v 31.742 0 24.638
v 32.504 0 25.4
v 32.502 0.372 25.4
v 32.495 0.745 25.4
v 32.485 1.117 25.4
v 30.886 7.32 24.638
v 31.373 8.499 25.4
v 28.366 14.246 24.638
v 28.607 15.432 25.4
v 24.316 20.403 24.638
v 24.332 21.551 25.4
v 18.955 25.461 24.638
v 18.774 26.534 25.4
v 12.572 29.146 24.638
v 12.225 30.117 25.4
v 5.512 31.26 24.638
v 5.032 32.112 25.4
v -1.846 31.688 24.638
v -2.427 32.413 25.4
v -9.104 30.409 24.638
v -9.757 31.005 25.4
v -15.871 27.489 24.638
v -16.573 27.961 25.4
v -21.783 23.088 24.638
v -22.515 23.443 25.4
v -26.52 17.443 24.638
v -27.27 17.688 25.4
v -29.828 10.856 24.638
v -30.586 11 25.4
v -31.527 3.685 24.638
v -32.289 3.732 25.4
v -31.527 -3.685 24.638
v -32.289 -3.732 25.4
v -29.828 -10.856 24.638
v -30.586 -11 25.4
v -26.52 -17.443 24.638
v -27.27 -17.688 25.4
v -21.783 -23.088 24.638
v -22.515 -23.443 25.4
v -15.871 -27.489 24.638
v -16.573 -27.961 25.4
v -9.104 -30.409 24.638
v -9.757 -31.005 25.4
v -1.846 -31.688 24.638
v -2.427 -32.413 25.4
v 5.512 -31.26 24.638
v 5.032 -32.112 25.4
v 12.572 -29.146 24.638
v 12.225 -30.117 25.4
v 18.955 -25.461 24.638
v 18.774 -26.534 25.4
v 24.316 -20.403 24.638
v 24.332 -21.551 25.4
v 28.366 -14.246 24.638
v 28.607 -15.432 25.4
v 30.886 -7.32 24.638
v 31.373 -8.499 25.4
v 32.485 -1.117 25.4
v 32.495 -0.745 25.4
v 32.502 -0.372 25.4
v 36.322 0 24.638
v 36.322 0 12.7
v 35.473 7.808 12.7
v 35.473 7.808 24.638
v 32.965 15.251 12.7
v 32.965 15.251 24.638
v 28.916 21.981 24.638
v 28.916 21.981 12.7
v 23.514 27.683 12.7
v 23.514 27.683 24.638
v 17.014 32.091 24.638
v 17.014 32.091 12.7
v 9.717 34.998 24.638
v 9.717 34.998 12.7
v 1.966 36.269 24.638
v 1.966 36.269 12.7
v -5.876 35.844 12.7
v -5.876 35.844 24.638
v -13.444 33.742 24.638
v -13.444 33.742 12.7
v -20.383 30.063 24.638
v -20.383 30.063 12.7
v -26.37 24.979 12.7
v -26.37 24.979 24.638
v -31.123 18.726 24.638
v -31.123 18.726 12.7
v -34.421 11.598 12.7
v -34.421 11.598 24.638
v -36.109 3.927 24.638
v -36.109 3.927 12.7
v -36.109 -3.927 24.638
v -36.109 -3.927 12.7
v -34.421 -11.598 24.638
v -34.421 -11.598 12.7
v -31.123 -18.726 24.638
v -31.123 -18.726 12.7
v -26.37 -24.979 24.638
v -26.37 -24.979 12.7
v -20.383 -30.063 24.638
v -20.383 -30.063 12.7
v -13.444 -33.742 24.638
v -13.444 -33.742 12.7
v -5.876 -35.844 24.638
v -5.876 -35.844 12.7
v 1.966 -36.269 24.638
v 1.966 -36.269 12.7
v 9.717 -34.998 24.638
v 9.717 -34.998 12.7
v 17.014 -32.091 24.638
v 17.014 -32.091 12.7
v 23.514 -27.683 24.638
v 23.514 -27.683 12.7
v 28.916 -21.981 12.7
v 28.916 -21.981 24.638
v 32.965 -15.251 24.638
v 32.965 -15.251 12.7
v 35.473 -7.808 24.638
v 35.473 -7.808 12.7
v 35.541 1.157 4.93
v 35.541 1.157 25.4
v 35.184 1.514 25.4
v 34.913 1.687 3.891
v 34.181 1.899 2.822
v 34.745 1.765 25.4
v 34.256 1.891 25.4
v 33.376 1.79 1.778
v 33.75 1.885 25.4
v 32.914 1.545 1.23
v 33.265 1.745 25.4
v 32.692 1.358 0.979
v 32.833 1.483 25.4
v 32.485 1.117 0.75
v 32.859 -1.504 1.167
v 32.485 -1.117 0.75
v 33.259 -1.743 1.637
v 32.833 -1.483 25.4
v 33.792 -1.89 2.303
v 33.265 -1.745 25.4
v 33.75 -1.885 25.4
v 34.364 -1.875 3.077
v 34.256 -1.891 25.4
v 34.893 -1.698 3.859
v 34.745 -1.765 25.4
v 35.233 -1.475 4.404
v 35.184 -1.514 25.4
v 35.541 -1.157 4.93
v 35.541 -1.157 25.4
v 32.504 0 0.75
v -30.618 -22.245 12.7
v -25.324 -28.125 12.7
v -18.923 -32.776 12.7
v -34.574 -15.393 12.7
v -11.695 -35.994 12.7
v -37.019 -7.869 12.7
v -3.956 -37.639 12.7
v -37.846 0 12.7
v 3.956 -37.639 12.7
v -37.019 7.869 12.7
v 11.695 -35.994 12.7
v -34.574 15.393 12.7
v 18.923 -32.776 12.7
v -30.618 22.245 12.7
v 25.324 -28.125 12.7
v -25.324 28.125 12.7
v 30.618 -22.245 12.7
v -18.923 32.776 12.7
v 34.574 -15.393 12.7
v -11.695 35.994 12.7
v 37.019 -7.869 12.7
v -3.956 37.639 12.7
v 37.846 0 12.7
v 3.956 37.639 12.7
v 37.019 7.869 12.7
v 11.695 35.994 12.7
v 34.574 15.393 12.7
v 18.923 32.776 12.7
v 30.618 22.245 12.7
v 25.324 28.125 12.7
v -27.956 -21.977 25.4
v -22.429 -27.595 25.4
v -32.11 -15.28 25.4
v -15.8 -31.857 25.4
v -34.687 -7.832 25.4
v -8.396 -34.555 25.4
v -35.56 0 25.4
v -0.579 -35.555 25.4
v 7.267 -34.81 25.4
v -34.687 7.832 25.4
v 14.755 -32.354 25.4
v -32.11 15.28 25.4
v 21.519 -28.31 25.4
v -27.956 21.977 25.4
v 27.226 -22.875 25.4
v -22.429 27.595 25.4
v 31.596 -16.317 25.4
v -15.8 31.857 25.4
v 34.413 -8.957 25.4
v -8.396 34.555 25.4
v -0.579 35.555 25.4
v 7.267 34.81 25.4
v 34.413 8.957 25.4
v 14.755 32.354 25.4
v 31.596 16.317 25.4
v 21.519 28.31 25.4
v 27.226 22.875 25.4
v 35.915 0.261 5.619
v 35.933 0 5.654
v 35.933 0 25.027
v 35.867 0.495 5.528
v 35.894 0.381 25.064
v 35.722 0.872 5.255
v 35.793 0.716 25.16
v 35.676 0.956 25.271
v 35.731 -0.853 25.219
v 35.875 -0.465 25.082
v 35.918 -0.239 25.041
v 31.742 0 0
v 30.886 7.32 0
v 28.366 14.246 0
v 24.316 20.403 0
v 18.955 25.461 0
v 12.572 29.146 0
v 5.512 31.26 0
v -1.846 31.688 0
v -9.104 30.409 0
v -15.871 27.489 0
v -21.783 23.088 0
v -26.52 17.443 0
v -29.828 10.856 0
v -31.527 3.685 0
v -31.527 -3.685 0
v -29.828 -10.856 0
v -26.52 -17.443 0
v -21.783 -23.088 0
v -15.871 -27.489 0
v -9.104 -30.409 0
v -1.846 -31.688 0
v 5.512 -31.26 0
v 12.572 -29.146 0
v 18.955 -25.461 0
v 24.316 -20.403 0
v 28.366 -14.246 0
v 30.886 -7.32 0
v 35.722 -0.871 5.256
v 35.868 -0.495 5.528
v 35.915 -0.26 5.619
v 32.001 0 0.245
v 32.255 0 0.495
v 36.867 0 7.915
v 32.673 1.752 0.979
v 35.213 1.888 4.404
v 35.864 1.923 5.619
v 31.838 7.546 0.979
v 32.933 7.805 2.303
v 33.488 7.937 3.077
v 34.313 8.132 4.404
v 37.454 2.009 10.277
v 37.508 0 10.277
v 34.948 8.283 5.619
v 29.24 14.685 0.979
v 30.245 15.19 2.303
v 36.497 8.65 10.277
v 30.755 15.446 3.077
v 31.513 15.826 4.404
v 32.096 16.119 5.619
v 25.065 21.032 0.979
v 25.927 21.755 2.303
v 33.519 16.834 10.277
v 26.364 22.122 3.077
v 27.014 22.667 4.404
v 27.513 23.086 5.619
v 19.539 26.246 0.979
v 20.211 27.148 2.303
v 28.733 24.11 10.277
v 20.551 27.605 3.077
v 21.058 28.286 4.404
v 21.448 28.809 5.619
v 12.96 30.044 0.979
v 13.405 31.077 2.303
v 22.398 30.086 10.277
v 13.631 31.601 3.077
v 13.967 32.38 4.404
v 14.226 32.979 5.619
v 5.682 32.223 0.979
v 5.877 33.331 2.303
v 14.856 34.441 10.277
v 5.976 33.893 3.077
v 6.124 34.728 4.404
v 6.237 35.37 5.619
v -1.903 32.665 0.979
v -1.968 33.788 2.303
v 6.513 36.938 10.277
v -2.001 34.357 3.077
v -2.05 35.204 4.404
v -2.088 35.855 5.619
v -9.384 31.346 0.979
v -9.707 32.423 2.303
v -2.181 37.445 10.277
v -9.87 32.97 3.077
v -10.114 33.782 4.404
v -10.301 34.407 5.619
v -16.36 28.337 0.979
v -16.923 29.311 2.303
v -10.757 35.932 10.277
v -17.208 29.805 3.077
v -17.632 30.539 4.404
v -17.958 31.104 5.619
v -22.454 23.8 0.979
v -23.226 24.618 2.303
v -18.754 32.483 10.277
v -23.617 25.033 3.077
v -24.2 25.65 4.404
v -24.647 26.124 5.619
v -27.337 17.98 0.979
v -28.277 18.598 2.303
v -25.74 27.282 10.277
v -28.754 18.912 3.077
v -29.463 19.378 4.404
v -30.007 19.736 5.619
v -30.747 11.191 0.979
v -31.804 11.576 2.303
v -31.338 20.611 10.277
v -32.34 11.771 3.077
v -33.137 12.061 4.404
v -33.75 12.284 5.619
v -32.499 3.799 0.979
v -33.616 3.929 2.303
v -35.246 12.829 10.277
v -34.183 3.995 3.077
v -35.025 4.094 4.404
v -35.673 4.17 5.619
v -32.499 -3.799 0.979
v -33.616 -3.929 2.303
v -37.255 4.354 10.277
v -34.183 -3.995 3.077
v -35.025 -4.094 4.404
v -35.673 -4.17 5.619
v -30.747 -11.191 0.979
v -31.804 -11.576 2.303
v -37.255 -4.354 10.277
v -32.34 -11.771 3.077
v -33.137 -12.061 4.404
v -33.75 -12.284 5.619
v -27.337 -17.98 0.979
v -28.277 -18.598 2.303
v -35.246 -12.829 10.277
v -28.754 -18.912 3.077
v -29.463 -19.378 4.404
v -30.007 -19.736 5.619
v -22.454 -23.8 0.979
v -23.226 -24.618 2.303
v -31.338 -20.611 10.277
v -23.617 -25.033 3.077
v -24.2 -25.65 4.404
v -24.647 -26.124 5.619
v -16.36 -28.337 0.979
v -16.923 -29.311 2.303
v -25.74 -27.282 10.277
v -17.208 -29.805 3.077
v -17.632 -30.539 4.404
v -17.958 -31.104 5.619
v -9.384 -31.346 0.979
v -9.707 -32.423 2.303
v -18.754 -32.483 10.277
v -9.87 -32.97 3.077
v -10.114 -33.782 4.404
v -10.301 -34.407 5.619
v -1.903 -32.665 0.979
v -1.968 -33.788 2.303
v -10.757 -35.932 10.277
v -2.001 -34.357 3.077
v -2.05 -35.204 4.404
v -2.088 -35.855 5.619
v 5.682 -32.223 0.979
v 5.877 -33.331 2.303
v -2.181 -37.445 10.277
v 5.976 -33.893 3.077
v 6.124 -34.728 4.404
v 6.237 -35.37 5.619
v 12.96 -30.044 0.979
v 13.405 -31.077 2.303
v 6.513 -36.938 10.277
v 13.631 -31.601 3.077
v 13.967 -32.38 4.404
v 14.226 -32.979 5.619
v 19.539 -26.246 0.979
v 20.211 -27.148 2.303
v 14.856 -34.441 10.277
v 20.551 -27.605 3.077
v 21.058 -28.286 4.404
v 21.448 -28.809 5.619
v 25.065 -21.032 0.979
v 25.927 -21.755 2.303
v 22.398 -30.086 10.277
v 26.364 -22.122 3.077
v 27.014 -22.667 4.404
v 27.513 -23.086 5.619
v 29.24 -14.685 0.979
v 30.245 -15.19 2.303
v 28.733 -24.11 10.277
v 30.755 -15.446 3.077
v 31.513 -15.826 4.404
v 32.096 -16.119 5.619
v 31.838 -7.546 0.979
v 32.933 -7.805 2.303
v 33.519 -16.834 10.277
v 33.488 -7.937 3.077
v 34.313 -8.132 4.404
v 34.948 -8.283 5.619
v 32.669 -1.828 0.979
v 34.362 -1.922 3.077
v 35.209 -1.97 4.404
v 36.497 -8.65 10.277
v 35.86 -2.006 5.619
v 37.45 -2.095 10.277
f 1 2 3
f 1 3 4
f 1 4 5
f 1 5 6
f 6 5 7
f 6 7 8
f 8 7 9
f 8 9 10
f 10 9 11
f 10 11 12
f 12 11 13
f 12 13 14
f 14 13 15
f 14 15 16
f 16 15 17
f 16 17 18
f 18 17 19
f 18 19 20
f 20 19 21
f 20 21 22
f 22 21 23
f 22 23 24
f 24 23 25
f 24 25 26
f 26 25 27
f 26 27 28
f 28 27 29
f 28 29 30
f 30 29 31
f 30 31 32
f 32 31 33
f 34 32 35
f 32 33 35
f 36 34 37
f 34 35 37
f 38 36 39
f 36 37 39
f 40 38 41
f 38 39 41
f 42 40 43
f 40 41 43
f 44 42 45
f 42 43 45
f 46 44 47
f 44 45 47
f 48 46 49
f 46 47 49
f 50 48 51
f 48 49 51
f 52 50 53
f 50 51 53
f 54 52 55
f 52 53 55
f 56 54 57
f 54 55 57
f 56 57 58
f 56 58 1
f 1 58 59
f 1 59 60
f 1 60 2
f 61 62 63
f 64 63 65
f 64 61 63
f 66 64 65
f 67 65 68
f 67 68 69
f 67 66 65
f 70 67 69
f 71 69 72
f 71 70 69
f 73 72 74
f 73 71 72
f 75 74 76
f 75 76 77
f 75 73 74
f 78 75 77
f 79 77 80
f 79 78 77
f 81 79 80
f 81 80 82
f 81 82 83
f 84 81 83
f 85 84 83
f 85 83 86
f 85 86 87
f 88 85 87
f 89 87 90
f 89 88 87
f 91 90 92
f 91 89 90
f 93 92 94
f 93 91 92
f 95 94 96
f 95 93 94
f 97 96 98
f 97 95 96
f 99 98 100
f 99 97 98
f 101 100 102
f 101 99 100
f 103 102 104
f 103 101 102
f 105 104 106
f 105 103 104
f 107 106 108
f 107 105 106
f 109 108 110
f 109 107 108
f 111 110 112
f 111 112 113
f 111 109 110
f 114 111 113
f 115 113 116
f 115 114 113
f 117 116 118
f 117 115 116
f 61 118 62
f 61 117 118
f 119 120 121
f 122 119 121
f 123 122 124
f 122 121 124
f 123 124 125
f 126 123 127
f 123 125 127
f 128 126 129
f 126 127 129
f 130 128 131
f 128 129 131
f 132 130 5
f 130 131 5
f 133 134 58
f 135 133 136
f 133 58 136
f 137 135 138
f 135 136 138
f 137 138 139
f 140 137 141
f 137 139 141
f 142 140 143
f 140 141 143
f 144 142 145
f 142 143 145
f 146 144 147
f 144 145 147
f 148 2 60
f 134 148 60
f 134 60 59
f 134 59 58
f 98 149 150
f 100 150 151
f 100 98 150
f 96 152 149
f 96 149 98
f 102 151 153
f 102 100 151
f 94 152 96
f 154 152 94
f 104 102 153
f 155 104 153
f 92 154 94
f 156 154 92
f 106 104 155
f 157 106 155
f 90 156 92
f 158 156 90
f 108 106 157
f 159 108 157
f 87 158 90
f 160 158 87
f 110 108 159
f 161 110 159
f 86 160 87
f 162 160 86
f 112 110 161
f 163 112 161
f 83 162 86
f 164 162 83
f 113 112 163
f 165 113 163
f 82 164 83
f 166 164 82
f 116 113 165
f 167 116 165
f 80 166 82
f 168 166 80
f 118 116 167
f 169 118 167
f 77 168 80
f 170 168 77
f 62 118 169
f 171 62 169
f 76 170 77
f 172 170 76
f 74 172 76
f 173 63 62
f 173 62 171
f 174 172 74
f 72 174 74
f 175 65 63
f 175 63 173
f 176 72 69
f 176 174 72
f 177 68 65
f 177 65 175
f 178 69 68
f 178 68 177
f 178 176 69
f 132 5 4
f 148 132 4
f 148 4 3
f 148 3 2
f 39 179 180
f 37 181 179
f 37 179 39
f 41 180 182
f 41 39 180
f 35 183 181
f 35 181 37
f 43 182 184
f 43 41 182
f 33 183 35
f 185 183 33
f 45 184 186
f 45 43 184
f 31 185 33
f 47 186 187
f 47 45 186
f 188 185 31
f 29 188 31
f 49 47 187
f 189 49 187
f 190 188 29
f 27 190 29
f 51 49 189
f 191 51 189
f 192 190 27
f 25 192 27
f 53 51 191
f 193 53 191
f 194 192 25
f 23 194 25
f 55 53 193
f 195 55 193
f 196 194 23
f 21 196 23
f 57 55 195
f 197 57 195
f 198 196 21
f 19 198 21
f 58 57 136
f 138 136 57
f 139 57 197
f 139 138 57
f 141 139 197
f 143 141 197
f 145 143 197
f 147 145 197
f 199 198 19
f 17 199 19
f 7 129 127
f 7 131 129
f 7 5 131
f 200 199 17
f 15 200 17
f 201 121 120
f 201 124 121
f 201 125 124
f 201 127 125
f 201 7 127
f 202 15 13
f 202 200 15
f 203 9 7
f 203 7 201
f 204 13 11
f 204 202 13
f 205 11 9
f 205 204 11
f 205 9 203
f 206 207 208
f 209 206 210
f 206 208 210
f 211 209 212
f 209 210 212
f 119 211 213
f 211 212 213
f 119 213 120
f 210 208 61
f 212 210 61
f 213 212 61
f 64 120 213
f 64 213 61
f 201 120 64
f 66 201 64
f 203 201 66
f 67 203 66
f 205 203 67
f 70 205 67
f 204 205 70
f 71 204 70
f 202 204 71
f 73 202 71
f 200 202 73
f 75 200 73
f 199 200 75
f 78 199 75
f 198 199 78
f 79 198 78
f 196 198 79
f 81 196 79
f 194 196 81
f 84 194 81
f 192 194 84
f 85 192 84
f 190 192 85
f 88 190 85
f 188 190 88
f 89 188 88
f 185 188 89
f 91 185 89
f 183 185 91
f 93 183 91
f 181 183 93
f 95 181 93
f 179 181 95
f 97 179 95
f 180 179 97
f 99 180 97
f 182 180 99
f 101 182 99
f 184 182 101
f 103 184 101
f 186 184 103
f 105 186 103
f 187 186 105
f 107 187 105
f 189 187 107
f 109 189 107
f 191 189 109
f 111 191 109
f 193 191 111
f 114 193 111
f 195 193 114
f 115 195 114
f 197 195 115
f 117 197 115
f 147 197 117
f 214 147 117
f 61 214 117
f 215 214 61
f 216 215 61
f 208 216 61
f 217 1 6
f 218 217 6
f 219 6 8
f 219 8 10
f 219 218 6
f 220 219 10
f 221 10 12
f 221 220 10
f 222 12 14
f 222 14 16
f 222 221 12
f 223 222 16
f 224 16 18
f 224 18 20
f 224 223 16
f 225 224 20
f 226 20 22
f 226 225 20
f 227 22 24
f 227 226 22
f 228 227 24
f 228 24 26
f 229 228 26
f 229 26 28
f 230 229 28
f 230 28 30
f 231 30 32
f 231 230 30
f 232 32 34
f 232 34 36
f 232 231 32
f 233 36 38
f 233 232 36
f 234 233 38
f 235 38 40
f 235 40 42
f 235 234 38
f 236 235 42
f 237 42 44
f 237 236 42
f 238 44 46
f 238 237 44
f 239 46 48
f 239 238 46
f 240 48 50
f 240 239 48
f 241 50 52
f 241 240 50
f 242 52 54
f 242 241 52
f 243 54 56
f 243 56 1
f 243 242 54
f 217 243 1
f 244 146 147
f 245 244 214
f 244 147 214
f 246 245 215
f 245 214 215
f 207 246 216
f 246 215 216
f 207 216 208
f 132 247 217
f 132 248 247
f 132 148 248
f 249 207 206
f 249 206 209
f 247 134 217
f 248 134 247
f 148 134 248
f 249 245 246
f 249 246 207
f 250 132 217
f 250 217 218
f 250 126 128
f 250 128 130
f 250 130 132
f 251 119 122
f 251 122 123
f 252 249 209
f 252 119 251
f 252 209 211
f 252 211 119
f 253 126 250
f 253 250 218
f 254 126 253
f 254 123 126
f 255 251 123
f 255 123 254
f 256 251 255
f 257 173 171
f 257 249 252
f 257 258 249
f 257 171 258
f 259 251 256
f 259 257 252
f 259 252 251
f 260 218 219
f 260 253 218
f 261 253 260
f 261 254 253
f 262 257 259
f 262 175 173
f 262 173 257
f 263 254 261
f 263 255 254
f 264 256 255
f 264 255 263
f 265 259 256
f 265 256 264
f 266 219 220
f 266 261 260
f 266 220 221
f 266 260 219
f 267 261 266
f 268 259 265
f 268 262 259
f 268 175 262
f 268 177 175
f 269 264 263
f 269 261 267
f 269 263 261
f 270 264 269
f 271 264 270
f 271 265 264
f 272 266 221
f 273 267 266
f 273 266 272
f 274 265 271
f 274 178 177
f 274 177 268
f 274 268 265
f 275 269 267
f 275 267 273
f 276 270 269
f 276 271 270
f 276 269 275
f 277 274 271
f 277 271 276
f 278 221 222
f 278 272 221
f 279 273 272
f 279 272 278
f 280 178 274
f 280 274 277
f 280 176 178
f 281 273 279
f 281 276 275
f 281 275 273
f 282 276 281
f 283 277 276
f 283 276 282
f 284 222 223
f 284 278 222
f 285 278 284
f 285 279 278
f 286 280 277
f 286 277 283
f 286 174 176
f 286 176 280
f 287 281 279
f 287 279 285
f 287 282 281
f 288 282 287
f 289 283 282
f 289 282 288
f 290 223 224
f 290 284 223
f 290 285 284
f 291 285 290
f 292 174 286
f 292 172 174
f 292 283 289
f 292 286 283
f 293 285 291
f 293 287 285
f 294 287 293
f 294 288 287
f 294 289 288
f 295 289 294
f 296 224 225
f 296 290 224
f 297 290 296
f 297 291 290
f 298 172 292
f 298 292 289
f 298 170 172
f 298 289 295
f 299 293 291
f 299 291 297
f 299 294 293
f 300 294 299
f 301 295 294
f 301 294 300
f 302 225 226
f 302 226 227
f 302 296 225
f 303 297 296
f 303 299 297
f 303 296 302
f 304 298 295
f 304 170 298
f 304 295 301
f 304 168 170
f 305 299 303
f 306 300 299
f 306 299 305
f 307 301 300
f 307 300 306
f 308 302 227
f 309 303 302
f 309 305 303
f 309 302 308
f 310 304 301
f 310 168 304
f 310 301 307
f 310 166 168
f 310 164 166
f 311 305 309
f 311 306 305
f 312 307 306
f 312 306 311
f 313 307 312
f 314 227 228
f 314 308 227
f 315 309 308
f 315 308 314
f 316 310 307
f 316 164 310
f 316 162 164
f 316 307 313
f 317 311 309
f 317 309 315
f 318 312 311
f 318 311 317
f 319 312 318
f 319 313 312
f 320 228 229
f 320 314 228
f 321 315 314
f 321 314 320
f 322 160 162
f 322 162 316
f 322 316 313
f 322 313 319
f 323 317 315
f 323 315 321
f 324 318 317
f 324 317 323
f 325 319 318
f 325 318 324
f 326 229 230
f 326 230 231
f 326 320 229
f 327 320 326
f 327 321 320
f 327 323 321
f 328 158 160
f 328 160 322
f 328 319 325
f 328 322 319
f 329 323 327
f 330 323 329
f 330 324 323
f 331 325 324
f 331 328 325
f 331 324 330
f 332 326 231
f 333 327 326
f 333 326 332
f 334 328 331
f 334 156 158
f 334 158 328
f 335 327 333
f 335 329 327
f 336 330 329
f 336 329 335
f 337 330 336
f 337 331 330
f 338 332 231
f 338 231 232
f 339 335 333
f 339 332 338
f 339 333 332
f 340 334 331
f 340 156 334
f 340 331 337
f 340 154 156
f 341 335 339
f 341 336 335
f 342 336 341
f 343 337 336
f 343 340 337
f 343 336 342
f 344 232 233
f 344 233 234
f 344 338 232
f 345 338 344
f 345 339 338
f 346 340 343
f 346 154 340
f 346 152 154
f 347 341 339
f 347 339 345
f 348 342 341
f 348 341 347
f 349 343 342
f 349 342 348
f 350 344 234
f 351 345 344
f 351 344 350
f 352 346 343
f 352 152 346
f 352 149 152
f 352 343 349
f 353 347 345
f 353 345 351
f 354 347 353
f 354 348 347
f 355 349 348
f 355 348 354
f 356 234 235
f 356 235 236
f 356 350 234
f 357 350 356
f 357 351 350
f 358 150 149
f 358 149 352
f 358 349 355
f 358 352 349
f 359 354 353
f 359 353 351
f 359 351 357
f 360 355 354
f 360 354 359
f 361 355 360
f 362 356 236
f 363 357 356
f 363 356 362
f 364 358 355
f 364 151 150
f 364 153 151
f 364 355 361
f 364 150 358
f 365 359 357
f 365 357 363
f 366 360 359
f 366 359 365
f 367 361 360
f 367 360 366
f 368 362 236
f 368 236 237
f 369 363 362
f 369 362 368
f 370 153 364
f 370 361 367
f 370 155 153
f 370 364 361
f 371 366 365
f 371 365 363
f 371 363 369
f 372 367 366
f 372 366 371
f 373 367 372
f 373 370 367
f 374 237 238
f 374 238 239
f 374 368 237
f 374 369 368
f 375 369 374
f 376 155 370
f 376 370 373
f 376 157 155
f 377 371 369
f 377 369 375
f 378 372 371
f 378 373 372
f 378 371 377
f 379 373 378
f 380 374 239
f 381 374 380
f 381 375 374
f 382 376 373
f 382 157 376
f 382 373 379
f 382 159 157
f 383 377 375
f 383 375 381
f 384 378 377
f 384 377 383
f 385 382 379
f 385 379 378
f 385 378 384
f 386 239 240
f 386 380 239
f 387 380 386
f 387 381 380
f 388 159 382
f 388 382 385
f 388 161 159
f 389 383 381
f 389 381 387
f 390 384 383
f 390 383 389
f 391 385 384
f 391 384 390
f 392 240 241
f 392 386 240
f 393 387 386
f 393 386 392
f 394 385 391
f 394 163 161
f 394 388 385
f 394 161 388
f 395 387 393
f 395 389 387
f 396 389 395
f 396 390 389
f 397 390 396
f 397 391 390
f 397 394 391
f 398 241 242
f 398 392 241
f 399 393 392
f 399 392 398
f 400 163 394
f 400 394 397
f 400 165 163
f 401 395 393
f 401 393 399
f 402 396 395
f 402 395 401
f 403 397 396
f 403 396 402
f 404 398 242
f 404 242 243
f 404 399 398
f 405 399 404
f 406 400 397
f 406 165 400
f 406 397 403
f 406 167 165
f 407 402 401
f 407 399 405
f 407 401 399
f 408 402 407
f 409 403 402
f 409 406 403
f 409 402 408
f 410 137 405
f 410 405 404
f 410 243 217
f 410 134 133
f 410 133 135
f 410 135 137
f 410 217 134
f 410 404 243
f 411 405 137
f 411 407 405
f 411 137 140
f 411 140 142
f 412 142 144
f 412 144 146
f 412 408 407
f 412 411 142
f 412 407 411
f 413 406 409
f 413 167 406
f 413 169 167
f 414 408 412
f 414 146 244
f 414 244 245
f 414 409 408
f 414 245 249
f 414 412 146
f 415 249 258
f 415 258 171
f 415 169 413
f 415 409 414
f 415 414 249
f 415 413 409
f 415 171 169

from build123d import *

# Parameters (mm, degrees)
F2_SIZE  = 0.762
F4_DEPTH = 25.4


with BuildPart() as f1:
    # F0 (on Front) → F1 (revolve)
    with BuildSketch(Plane.XZ):
        with BuildLine():
            Line((31.742, 25.4), (31.742, 0))
            ThreePointArc((31.742, 0), (35.9915506311, 5.7744213345), (37.846, 12.7))
            Line((37.846, 12.7), (36.322, 12.7))
            Line((36.322, 12.7), (36.322, 25.4))
            Line((36.322, 25.4), (31.742, 25.4))
        make_face()
    revolve(axis=Axis((0, 0, 7.8702876784), (0, 0, 1)))

    # F2
    f2_edges = [f1.edges().sort_by_distance(p)[0] for p in [
        (-31.742, 0, 25.4),
        (-36.322, 0, 25.4),
    ]]
    chamfer(f2_edges, length=F2_SIZE)

    # F3 (on face) → F4 (cut)
    with BuildSketch(Plane.XY.offset(25.4)):
        with BuildLine():
            ThreePointArc((35.56, 0), (35.5552903274, 0.5787311389), (35.5411625573, 1.15730898))
            ThreePointArc((35.5411625573, 1.15730898), (34.002844509, 1.9048339039), (32.4848033237, 1.1169462916))
            ThreePointArc((32.4848033237, 1.1169462916), (32.4992004766, 0.5585556218), (32.504, 0))
            ThreePointArc((32.504, 0), (32.4992004766, -0.5585556218), (32.4848033237, -1.1169462916))
            ThreePointArc((32.4848033237, -1.1169462916), (34.002844509, -1.9048339039), (35.5411625573, -1.15730898))
            ThreePointArc((35.5411625573, -1.15730898), (35.5552903274, -0.5787311389), (35.56, 0))
        make_face()
        with BuildLine():
            ThreePointArc((35.5411625573, -1.15730898), (35.8323835058, -0.6109215696), (35.933, 0))
            ThreePointArc((35.933, 0), (35.8323835058, 0.6109215696), (35.5411625573, 1.15730898))
            ThreePointArc((35.5411625573, 1.15730898), (35.5552903274, 0.5787311389), (35.56, 0))
            ThreePointArc((35.56, 0), (35.5552903274, -0.5787311389), (35.5411625573, -1.15730898))
        make_face()
    extrude(amount=-F4_DEPTH, mode=Mode.SUBTRACT)


solid = f1.part
